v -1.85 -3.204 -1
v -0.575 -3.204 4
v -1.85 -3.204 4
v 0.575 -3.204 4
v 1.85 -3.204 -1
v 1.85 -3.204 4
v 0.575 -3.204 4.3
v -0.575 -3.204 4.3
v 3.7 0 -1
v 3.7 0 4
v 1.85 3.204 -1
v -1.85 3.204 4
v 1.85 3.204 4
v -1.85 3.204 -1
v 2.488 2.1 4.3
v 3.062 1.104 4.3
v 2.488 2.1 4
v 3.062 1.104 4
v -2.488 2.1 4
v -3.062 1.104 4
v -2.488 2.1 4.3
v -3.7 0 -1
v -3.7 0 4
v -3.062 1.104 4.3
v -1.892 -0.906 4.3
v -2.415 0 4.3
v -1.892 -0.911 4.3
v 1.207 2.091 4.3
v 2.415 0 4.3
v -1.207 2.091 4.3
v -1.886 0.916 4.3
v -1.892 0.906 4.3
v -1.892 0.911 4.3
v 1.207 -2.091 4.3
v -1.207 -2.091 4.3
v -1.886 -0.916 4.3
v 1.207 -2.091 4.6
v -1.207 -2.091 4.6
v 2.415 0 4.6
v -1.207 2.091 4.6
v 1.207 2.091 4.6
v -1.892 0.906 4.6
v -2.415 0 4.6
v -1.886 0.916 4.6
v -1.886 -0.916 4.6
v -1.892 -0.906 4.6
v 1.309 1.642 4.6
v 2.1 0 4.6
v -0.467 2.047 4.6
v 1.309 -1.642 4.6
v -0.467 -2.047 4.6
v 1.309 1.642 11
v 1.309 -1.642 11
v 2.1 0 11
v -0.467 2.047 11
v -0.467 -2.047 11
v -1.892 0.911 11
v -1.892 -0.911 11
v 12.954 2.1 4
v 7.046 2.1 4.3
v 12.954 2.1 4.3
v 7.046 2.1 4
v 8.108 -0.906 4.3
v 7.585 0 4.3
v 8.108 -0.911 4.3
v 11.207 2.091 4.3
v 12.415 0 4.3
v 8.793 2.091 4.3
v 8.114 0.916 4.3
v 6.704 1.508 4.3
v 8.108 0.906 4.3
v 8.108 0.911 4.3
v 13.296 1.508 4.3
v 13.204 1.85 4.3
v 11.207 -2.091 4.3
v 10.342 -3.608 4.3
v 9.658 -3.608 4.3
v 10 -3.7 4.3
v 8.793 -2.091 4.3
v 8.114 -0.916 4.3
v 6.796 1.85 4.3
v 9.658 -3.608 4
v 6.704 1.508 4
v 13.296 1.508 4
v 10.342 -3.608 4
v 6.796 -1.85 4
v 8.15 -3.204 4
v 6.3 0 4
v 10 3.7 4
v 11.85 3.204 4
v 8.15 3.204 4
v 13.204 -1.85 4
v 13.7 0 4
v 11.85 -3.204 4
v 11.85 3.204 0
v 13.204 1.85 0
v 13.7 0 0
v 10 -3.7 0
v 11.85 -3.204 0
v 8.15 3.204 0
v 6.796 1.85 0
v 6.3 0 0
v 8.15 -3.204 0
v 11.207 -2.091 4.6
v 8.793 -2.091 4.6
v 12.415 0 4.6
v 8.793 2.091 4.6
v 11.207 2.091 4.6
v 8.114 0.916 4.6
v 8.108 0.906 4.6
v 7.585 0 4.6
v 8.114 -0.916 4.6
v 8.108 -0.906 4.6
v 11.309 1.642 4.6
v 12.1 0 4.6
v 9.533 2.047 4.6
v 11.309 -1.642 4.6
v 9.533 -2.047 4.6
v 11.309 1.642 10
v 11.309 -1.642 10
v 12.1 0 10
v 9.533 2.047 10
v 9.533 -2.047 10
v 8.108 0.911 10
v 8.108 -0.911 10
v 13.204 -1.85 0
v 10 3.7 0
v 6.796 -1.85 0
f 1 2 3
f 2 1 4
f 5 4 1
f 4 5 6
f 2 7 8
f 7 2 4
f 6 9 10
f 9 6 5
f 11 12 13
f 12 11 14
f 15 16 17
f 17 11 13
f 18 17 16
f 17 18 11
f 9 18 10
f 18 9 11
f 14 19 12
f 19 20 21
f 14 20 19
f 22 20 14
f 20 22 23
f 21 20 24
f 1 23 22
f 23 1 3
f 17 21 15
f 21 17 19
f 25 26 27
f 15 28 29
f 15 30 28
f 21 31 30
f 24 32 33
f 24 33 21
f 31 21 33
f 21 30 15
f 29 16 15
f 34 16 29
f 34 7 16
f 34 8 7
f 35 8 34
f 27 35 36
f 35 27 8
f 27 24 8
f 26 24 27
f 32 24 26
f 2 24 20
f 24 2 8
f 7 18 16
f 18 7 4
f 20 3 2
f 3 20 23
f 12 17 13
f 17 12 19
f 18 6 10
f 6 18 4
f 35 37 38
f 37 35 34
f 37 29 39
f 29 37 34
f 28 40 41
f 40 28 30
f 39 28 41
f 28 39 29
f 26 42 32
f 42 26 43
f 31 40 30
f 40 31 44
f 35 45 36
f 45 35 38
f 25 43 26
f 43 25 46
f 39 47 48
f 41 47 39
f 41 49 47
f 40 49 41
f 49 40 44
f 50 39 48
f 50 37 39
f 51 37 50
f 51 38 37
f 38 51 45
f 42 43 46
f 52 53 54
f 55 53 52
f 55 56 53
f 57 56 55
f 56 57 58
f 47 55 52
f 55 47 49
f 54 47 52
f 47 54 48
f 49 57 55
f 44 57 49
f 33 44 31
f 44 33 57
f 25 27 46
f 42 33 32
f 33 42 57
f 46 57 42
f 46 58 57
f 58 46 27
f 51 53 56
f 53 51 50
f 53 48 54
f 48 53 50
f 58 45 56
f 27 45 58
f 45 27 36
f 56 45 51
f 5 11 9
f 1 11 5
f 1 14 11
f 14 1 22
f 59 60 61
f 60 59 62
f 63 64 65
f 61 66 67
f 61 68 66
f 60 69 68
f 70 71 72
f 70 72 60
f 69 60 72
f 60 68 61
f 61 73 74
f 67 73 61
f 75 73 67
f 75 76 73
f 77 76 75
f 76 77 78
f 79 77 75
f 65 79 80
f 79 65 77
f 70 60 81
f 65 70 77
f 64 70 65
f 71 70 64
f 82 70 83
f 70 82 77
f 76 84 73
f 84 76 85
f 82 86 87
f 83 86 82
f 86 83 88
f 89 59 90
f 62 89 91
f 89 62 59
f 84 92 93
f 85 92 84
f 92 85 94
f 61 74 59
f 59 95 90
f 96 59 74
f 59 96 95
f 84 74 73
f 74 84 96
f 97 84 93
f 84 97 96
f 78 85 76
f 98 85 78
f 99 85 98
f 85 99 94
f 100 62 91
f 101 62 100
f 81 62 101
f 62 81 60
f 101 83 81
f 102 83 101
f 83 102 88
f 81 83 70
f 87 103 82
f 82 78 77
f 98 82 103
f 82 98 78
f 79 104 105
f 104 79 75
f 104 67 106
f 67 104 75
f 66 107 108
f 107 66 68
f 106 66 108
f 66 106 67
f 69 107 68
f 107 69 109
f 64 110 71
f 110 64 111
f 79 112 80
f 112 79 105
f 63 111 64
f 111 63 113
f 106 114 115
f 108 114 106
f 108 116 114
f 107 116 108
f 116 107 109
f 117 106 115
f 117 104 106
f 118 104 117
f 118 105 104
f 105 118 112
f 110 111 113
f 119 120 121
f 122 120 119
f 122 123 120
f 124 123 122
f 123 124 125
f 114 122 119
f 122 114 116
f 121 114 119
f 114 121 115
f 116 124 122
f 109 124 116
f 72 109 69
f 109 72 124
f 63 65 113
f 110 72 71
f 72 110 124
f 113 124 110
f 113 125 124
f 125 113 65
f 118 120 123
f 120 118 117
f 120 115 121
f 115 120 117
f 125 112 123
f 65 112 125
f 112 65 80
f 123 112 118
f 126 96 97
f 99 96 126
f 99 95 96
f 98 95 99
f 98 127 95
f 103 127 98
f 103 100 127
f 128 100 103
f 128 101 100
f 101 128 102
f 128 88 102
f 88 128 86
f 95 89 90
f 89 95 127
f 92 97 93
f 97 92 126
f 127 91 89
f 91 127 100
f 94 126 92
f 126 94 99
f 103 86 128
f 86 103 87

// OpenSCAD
// file: bolt_sizes.scad
/*
 *    OpenScad constants for bolt
 *
 *    Copyright (C) 2016 Felipe Machado
 *    Universidad Rey Juan Carlos, Spain
 *    https://github.com/felipe-m
 *    License: LGPL 3.0 or later
 *
 *    to use this functions include in your file:
 * include <bolts.scad>
 *    if not in the same directory:
 * include <PATH_TO/bolts.scad>
*/


// Tolerance
tol =  0.4;
// Tolerance for small objects
stol = 0.2;

h_layer3d = 0.3;
//$fa=1;
//$fs=0.5;

// Nuts and bolt sizes
m3_r = 1.5;  
m4_r = 2;    
m5_r = 2.5;  

// Tolerances stol/2 because is the radius
m3_r_tol = m3_r + stol/2;  // M3 diameter 3.2 mm for the tolerance
m4_r_tol = m4_r + stol/2;  // M4 diameter 4.2 mm for the tolerance
m5_r_tol = m5_r + (tol + stol)/4;  // M5 diameter 5.3 mm for the tolerance
//echo ("m3_r_tol", m3_r_tol);
//echo ("m4_r_tol", m4_r_tol);

// -------------- Head sizes DIN-912 bolts
// Head radius DIN-912 bolts
m3_head_r  = 5.5/2;
m4_head_r  = 7/2;
m5_head_r  = 8.5/2;
m6_head_r  = 10/2;
m8_head_r  = 13/2;
m10_head_r = 16/2;

// Head radius DIN-912 bolts with tolerances. 
// divided by 2 because is the radius
m3_head_r_tol  = m3_head_r  + tol/2;
m4_head_r_tol  = m4_head_r  + tol/2;
m5_head_r_tol  = m5_head_r  + tol/2;
m6_head_r_tol  = m6_head_r  + tol/2;
m8_head_r_tol  = m8_head_r  + tol/2;
m10_head_r_tol = m10_head_r + tol/2;

// Head length DIN-912 bolts
m3_head_l = 3;
m4_head_l = 4;
m5_head_l = 4;
m6_head_l = 6;
m8_head_l = 8;

// M3 nut
m3_nut_r = 6.01/2;  // DIN934 M3 nut circumradius
m3_nut_h = 2.4;     // DIN934 M3 nut height

//less tolerance for small numbers. 0.2 (diameter)
m3_nut_r_tol = m3_nut_r + stol/2;  //radius: diam/2
m3_nut_h_tol = m3_nut_h + tol;

// M4 nut
m4_nut_r = 7.66/2;  // DIN934 M4 nut circumradius
m4_nut_h = 3.2;     // DIN934 M4 nut height
m4_nut_ap = 7/2;    // DIN934 M4 nut apotheme

//less tolerance for small numbers. 0.2 (diameter)
m4_nut_r_tol  = m4_nut_r + stol/2;  //radius: diam/2
m4_nut_h_tol  = m4_nut_h + tol;
m4_nut_ap_tol = m4_nut_ap + stol/2; 

// -------------------- DIN 9021 Washers ----------------
// outer radius (or)
m6_wash9021_or = 18 / 2;
// height
m6_wash9021_h = 1.6;
// main file
/*
 *    OpenScad functions to make bolt holes
 *
 *    Copyright (C) 2016 Felipe Machado
 *    Universidad Rey Juan Carlos, Spain
 *    https://github.com/felipe-m
 *    License: LGPL 3.0 or later
 *
 *    to use this functions include in your file:
 * use <bolts.scad>
 *    if not in the same directory:
 * use <PATH_TO/bolts.scad>
 *    dont use 'include' instead of 'use' so you dont get the objects
 *    created in this file
*/


include <bolt_sizes.scad>

// the hole for the bolt shank and the nut
// Tolerances have to be included
// r_shank: Radius of the shank (tolerance included)
// l_bolt: total length of the bolt: head & shank
// r_head: radius of the head (tolerance included)
// l_head: length of the head
// hex_head: inidicates if the head is hexagonal or rounded
//            1: hexagonal
//            0: rounded
// h_layer3d: height of the layer for printing, if 0, means that the support
//            is not needed
// mnfold: 1 if you want 1 mm on top and botton to avoid non-manifold
//             pieces after makeing differences


module bolt_hole (r_shank, l_bolt, r_head, l_head, hex_head, h_layer3d, mnfold)
{
  union () {
    // we make it all the way, although it is not necessary because
    // on the lower part it will be also the nut 
    // if mnfold == 1 it will make the translations and make the piece 
    // larger
    translate([0,0,-mnfold])
      cylinder (r= r_shank, h= l_bolt+2*mnfold);
      //cylinder (r= r_shank, h= l_bolt+2*mnfold, $fa=1, $fs=0.5);
   if (hex_head == 0) {
      translate([0,0,-mnfold])
        cylinder (r= r_head, h= l_head+mnfold);  
        //cylinder (r= r_head, h= l_head+mnfold, $fa=1, $fs=0.5);  
   } else {
      translate([0,0,-mnfold])
      cylinder (r= r_head, h= l_head+mnfold, $fn=6);  
   }
    
  // This is a triangle that it is barely supported by the bolt head
  // and it will support the circle above 
  // In a regular triangle the apotheme (in radius) is twice
  // the circumradius (r)
  // Intersection with the hexagon to take the vertexs away, because
  // they are outside the hexagon
  if ( h_layer3d > 0) { // we don't do this if h_layer3d == 0
    intersection () {  
      rotate([0,0,30])translate([0,0,l_head])
        cylinder (r= r_shank*2, h=h_layer3d, $fn=3);
      // take vetexs away:
      if (hex_head == 0) {
        translate([0,0,l_head])
          cylinder (r= r_head, h= h_layer3d);       
          //cylinder (r= r_head, h= h_layer3d, $fa=1, $fs=0.5);       
      } else {
        translate([0,0,l_head])
          cylinder (r= r_head, h= h_layer3d, $fn=6);           
      }
    }
        // 1.15 is the relationship between the Radius and the Apothem
    // of the hexagon: sqrt(3)/2 . I make it slightly smaller
    translate([0,0,l_head+h_layer3d])
      //rotate ([0,0,30])
      cylinder (r=r_shank*1.15, h=h_layer3d, $fn=6);  
  
  }
 
 }  
  
}



bolt_hole (r_shank= m4_r_tol, l_bolt=10, r_head=m4_head_r_tol, l_head=m4_head_l, h_layer3d);


bolt_hole (r_shank = m4_r_tol, l_bolt=10, r_head=m4_head_r_tol, l_head=m4_head_l, hex_head=1, h_layer3d=h_layer3d, mnfold=1);

translate ([10,0,0])
#bolt_hole (r_shank = m4_r_tol, l_bolt=10, r_head=m4_head_r_tol, l_head=m4_head_l, hex_head=0, h_layer3d=h_layer3d, mnfold=0);
